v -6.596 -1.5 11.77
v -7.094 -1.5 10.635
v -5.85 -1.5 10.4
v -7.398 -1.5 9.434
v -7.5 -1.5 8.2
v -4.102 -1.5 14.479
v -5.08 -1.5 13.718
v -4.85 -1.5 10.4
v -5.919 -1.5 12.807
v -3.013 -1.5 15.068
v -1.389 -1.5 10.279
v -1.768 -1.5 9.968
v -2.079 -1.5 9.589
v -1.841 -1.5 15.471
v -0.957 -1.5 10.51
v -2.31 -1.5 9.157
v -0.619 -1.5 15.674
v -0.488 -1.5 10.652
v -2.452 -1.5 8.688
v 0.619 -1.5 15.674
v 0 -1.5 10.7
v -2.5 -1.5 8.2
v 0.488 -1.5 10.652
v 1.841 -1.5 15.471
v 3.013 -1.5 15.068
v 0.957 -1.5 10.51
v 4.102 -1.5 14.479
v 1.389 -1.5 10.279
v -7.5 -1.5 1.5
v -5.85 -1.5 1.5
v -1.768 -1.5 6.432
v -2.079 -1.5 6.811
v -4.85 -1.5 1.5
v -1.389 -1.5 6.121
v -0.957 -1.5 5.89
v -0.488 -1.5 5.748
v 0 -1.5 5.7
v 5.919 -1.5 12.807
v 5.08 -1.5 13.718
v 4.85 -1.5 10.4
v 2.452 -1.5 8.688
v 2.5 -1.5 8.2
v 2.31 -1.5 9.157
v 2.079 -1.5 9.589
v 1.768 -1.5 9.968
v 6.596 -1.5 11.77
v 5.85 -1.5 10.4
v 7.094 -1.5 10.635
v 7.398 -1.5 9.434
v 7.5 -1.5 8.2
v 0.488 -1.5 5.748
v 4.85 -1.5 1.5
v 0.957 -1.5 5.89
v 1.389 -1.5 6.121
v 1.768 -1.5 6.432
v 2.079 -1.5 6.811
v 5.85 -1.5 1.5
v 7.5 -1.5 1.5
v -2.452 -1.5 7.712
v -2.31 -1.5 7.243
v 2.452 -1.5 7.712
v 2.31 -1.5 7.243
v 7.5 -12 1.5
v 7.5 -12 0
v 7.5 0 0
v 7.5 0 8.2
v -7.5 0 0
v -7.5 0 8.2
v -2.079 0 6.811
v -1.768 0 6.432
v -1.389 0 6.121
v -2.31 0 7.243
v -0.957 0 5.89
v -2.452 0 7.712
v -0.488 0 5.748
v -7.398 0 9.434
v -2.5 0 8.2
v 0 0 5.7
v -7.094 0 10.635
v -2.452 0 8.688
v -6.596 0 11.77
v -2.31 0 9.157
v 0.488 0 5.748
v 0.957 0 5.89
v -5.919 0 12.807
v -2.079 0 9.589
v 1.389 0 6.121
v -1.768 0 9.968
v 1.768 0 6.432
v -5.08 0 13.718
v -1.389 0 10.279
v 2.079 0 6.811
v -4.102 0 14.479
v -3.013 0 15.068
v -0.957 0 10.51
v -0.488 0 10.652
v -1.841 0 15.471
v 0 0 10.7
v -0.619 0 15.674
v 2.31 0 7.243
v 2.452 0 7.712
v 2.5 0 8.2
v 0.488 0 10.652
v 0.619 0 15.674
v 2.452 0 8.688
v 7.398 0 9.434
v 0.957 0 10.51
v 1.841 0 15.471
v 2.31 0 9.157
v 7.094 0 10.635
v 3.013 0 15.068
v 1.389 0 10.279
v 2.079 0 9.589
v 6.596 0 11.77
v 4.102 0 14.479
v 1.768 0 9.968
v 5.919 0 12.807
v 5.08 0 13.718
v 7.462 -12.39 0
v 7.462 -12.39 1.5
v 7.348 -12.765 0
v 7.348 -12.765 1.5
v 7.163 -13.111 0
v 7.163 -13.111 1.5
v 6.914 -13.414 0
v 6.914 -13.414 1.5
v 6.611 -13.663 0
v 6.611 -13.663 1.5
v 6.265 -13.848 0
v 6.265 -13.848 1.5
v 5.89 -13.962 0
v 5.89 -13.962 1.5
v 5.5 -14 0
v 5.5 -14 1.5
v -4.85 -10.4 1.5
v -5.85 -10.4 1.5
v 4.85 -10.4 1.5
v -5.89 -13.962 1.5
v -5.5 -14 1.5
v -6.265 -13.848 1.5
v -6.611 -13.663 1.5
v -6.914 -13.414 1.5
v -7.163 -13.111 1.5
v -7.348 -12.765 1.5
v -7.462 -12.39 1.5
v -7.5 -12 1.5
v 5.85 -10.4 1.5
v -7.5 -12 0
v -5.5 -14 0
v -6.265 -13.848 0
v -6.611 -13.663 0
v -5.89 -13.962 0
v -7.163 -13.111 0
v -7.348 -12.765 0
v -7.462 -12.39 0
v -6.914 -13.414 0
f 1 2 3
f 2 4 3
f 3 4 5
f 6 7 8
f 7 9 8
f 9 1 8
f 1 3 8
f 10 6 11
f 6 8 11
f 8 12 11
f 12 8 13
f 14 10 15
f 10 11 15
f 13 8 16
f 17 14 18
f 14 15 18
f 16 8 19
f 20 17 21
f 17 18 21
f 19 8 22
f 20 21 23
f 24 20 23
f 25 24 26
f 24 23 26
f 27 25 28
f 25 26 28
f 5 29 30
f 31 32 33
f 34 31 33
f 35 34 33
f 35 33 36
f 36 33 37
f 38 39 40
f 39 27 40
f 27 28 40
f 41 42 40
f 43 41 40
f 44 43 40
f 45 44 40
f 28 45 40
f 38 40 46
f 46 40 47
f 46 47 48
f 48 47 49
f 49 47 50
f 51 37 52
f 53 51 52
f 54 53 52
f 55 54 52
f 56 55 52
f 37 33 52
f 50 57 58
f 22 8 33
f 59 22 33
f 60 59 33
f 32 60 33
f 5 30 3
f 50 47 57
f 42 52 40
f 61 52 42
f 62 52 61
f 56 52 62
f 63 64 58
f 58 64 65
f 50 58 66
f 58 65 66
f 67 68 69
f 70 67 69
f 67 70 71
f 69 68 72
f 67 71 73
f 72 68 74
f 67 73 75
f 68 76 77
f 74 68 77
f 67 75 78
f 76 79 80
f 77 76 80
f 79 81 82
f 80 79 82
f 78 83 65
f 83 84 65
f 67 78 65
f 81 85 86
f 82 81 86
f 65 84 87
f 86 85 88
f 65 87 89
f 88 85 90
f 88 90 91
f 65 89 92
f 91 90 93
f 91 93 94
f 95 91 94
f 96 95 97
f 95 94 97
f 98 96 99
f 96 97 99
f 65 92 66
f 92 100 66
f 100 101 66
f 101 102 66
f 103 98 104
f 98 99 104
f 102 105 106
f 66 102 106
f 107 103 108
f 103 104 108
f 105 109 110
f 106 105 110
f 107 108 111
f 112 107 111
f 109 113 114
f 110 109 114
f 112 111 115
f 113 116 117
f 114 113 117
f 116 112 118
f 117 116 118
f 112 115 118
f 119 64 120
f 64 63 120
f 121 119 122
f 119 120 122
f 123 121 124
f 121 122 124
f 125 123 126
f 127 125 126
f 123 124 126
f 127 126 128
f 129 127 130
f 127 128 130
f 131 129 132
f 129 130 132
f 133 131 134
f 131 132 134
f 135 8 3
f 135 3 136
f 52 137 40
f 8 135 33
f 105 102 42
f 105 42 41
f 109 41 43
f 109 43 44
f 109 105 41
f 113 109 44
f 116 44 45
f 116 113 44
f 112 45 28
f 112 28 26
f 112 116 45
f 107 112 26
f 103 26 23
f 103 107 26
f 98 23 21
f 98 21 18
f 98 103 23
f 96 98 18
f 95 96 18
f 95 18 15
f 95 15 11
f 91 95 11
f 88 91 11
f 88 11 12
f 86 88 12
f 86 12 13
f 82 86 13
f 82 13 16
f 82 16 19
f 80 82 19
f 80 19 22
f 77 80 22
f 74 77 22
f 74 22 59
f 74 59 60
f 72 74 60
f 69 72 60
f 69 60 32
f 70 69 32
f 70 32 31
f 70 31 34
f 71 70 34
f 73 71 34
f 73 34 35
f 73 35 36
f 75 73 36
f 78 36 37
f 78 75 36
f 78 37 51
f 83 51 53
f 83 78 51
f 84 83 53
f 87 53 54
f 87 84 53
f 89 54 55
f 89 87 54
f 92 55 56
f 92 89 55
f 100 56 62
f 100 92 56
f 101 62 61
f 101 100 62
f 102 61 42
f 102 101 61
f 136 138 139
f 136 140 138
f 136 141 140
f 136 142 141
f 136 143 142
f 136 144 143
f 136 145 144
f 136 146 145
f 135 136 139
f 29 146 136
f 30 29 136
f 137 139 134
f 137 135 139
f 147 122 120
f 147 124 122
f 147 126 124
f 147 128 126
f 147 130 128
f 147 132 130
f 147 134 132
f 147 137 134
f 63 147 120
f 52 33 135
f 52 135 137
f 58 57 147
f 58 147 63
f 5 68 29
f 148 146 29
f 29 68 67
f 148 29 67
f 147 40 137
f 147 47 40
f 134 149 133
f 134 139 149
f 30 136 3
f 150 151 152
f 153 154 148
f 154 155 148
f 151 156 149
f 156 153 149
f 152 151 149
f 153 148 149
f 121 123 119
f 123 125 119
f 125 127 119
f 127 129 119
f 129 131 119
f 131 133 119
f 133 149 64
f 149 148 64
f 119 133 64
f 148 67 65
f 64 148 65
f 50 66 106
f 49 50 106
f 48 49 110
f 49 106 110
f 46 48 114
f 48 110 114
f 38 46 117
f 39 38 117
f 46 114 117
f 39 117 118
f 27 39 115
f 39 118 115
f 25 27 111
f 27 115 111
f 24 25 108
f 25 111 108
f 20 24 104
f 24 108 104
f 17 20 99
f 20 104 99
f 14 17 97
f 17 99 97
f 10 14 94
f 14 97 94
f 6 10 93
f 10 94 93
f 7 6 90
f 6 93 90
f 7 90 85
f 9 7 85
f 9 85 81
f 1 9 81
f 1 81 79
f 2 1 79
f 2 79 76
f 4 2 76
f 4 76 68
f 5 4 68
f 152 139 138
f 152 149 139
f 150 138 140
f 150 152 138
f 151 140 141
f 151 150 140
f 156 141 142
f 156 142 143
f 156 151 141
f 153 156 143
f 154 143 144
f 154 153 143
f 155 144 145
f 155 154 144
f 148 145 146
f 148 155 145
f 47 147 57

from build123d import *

# Parameters (mm, degrees)
F0_R     = 2.5
F1_DEPTH = 14
F2_W     = 12.5
F2_H     = 16.927838
F3_DEPTH = 20
F5_DEPTH = 5.85
F6_W     = 9.7
F6_H     = 13.5
F7_DEPTH = 26.2
F8_R     = 2


with BuildPart() as f1:
    # F0 (on Front) → F1 (new body)
    with BuildSketch(Plane.XZ):
        with BuildLine():
            Line((7.5, 0), (7.5, 8.2))
            ThreePointArc((7.5, 8.2), (0, 15.7), (-7.5, 8.2))
            Line((-7.5, 8.2), (-7.5, 0))
            Line((-7.5, 0), (7.5, 0))
        make_face()
        with Locations((0, 8.2)):
            Circle(F0_R, mode=Mode.SUBTRACT)
    extrude(amount=F1_DEPTH)

    # F2 (on Right) → F3 (cut, symmetric)
    with BuildSketch(Plane.YZ):
        with Locations((-7.75, 9.963919)):
            Rectangle(F2_W, F2_H)
    extrude(amount=F3_DEPTH, both=True, mode=Mode.SUBTRACT)

    # F4 (on Right) → F5 (join, symmetric)
    with BuildSketch(Plane.YZ):
        Polygon((-1.5, 1.5), (-1.5, 10.4), (-10.4, 1.5), align=None)
    extrude(amount=F5_DEPTH, both=True)

    # F6 (on face) → F7 (cut)
    with BuildSketch(Plane.XY.offset(1.5)):
        with Locations((0, -8.25)):
            Rectangle(F6_W, F6_H)
    extrude(amount=F7_DEPTH, mode=Mode.SUBTRACT)

    # F8
    f8_edges = [f1.edges().sort_by_distance(p)[0] for p in [
        (7.5, -14, 0.75),
        (-7.5, -14, 0.75),
    ]]
    fillet(f8_edges, radius=F8_R)


solid = f1.part
